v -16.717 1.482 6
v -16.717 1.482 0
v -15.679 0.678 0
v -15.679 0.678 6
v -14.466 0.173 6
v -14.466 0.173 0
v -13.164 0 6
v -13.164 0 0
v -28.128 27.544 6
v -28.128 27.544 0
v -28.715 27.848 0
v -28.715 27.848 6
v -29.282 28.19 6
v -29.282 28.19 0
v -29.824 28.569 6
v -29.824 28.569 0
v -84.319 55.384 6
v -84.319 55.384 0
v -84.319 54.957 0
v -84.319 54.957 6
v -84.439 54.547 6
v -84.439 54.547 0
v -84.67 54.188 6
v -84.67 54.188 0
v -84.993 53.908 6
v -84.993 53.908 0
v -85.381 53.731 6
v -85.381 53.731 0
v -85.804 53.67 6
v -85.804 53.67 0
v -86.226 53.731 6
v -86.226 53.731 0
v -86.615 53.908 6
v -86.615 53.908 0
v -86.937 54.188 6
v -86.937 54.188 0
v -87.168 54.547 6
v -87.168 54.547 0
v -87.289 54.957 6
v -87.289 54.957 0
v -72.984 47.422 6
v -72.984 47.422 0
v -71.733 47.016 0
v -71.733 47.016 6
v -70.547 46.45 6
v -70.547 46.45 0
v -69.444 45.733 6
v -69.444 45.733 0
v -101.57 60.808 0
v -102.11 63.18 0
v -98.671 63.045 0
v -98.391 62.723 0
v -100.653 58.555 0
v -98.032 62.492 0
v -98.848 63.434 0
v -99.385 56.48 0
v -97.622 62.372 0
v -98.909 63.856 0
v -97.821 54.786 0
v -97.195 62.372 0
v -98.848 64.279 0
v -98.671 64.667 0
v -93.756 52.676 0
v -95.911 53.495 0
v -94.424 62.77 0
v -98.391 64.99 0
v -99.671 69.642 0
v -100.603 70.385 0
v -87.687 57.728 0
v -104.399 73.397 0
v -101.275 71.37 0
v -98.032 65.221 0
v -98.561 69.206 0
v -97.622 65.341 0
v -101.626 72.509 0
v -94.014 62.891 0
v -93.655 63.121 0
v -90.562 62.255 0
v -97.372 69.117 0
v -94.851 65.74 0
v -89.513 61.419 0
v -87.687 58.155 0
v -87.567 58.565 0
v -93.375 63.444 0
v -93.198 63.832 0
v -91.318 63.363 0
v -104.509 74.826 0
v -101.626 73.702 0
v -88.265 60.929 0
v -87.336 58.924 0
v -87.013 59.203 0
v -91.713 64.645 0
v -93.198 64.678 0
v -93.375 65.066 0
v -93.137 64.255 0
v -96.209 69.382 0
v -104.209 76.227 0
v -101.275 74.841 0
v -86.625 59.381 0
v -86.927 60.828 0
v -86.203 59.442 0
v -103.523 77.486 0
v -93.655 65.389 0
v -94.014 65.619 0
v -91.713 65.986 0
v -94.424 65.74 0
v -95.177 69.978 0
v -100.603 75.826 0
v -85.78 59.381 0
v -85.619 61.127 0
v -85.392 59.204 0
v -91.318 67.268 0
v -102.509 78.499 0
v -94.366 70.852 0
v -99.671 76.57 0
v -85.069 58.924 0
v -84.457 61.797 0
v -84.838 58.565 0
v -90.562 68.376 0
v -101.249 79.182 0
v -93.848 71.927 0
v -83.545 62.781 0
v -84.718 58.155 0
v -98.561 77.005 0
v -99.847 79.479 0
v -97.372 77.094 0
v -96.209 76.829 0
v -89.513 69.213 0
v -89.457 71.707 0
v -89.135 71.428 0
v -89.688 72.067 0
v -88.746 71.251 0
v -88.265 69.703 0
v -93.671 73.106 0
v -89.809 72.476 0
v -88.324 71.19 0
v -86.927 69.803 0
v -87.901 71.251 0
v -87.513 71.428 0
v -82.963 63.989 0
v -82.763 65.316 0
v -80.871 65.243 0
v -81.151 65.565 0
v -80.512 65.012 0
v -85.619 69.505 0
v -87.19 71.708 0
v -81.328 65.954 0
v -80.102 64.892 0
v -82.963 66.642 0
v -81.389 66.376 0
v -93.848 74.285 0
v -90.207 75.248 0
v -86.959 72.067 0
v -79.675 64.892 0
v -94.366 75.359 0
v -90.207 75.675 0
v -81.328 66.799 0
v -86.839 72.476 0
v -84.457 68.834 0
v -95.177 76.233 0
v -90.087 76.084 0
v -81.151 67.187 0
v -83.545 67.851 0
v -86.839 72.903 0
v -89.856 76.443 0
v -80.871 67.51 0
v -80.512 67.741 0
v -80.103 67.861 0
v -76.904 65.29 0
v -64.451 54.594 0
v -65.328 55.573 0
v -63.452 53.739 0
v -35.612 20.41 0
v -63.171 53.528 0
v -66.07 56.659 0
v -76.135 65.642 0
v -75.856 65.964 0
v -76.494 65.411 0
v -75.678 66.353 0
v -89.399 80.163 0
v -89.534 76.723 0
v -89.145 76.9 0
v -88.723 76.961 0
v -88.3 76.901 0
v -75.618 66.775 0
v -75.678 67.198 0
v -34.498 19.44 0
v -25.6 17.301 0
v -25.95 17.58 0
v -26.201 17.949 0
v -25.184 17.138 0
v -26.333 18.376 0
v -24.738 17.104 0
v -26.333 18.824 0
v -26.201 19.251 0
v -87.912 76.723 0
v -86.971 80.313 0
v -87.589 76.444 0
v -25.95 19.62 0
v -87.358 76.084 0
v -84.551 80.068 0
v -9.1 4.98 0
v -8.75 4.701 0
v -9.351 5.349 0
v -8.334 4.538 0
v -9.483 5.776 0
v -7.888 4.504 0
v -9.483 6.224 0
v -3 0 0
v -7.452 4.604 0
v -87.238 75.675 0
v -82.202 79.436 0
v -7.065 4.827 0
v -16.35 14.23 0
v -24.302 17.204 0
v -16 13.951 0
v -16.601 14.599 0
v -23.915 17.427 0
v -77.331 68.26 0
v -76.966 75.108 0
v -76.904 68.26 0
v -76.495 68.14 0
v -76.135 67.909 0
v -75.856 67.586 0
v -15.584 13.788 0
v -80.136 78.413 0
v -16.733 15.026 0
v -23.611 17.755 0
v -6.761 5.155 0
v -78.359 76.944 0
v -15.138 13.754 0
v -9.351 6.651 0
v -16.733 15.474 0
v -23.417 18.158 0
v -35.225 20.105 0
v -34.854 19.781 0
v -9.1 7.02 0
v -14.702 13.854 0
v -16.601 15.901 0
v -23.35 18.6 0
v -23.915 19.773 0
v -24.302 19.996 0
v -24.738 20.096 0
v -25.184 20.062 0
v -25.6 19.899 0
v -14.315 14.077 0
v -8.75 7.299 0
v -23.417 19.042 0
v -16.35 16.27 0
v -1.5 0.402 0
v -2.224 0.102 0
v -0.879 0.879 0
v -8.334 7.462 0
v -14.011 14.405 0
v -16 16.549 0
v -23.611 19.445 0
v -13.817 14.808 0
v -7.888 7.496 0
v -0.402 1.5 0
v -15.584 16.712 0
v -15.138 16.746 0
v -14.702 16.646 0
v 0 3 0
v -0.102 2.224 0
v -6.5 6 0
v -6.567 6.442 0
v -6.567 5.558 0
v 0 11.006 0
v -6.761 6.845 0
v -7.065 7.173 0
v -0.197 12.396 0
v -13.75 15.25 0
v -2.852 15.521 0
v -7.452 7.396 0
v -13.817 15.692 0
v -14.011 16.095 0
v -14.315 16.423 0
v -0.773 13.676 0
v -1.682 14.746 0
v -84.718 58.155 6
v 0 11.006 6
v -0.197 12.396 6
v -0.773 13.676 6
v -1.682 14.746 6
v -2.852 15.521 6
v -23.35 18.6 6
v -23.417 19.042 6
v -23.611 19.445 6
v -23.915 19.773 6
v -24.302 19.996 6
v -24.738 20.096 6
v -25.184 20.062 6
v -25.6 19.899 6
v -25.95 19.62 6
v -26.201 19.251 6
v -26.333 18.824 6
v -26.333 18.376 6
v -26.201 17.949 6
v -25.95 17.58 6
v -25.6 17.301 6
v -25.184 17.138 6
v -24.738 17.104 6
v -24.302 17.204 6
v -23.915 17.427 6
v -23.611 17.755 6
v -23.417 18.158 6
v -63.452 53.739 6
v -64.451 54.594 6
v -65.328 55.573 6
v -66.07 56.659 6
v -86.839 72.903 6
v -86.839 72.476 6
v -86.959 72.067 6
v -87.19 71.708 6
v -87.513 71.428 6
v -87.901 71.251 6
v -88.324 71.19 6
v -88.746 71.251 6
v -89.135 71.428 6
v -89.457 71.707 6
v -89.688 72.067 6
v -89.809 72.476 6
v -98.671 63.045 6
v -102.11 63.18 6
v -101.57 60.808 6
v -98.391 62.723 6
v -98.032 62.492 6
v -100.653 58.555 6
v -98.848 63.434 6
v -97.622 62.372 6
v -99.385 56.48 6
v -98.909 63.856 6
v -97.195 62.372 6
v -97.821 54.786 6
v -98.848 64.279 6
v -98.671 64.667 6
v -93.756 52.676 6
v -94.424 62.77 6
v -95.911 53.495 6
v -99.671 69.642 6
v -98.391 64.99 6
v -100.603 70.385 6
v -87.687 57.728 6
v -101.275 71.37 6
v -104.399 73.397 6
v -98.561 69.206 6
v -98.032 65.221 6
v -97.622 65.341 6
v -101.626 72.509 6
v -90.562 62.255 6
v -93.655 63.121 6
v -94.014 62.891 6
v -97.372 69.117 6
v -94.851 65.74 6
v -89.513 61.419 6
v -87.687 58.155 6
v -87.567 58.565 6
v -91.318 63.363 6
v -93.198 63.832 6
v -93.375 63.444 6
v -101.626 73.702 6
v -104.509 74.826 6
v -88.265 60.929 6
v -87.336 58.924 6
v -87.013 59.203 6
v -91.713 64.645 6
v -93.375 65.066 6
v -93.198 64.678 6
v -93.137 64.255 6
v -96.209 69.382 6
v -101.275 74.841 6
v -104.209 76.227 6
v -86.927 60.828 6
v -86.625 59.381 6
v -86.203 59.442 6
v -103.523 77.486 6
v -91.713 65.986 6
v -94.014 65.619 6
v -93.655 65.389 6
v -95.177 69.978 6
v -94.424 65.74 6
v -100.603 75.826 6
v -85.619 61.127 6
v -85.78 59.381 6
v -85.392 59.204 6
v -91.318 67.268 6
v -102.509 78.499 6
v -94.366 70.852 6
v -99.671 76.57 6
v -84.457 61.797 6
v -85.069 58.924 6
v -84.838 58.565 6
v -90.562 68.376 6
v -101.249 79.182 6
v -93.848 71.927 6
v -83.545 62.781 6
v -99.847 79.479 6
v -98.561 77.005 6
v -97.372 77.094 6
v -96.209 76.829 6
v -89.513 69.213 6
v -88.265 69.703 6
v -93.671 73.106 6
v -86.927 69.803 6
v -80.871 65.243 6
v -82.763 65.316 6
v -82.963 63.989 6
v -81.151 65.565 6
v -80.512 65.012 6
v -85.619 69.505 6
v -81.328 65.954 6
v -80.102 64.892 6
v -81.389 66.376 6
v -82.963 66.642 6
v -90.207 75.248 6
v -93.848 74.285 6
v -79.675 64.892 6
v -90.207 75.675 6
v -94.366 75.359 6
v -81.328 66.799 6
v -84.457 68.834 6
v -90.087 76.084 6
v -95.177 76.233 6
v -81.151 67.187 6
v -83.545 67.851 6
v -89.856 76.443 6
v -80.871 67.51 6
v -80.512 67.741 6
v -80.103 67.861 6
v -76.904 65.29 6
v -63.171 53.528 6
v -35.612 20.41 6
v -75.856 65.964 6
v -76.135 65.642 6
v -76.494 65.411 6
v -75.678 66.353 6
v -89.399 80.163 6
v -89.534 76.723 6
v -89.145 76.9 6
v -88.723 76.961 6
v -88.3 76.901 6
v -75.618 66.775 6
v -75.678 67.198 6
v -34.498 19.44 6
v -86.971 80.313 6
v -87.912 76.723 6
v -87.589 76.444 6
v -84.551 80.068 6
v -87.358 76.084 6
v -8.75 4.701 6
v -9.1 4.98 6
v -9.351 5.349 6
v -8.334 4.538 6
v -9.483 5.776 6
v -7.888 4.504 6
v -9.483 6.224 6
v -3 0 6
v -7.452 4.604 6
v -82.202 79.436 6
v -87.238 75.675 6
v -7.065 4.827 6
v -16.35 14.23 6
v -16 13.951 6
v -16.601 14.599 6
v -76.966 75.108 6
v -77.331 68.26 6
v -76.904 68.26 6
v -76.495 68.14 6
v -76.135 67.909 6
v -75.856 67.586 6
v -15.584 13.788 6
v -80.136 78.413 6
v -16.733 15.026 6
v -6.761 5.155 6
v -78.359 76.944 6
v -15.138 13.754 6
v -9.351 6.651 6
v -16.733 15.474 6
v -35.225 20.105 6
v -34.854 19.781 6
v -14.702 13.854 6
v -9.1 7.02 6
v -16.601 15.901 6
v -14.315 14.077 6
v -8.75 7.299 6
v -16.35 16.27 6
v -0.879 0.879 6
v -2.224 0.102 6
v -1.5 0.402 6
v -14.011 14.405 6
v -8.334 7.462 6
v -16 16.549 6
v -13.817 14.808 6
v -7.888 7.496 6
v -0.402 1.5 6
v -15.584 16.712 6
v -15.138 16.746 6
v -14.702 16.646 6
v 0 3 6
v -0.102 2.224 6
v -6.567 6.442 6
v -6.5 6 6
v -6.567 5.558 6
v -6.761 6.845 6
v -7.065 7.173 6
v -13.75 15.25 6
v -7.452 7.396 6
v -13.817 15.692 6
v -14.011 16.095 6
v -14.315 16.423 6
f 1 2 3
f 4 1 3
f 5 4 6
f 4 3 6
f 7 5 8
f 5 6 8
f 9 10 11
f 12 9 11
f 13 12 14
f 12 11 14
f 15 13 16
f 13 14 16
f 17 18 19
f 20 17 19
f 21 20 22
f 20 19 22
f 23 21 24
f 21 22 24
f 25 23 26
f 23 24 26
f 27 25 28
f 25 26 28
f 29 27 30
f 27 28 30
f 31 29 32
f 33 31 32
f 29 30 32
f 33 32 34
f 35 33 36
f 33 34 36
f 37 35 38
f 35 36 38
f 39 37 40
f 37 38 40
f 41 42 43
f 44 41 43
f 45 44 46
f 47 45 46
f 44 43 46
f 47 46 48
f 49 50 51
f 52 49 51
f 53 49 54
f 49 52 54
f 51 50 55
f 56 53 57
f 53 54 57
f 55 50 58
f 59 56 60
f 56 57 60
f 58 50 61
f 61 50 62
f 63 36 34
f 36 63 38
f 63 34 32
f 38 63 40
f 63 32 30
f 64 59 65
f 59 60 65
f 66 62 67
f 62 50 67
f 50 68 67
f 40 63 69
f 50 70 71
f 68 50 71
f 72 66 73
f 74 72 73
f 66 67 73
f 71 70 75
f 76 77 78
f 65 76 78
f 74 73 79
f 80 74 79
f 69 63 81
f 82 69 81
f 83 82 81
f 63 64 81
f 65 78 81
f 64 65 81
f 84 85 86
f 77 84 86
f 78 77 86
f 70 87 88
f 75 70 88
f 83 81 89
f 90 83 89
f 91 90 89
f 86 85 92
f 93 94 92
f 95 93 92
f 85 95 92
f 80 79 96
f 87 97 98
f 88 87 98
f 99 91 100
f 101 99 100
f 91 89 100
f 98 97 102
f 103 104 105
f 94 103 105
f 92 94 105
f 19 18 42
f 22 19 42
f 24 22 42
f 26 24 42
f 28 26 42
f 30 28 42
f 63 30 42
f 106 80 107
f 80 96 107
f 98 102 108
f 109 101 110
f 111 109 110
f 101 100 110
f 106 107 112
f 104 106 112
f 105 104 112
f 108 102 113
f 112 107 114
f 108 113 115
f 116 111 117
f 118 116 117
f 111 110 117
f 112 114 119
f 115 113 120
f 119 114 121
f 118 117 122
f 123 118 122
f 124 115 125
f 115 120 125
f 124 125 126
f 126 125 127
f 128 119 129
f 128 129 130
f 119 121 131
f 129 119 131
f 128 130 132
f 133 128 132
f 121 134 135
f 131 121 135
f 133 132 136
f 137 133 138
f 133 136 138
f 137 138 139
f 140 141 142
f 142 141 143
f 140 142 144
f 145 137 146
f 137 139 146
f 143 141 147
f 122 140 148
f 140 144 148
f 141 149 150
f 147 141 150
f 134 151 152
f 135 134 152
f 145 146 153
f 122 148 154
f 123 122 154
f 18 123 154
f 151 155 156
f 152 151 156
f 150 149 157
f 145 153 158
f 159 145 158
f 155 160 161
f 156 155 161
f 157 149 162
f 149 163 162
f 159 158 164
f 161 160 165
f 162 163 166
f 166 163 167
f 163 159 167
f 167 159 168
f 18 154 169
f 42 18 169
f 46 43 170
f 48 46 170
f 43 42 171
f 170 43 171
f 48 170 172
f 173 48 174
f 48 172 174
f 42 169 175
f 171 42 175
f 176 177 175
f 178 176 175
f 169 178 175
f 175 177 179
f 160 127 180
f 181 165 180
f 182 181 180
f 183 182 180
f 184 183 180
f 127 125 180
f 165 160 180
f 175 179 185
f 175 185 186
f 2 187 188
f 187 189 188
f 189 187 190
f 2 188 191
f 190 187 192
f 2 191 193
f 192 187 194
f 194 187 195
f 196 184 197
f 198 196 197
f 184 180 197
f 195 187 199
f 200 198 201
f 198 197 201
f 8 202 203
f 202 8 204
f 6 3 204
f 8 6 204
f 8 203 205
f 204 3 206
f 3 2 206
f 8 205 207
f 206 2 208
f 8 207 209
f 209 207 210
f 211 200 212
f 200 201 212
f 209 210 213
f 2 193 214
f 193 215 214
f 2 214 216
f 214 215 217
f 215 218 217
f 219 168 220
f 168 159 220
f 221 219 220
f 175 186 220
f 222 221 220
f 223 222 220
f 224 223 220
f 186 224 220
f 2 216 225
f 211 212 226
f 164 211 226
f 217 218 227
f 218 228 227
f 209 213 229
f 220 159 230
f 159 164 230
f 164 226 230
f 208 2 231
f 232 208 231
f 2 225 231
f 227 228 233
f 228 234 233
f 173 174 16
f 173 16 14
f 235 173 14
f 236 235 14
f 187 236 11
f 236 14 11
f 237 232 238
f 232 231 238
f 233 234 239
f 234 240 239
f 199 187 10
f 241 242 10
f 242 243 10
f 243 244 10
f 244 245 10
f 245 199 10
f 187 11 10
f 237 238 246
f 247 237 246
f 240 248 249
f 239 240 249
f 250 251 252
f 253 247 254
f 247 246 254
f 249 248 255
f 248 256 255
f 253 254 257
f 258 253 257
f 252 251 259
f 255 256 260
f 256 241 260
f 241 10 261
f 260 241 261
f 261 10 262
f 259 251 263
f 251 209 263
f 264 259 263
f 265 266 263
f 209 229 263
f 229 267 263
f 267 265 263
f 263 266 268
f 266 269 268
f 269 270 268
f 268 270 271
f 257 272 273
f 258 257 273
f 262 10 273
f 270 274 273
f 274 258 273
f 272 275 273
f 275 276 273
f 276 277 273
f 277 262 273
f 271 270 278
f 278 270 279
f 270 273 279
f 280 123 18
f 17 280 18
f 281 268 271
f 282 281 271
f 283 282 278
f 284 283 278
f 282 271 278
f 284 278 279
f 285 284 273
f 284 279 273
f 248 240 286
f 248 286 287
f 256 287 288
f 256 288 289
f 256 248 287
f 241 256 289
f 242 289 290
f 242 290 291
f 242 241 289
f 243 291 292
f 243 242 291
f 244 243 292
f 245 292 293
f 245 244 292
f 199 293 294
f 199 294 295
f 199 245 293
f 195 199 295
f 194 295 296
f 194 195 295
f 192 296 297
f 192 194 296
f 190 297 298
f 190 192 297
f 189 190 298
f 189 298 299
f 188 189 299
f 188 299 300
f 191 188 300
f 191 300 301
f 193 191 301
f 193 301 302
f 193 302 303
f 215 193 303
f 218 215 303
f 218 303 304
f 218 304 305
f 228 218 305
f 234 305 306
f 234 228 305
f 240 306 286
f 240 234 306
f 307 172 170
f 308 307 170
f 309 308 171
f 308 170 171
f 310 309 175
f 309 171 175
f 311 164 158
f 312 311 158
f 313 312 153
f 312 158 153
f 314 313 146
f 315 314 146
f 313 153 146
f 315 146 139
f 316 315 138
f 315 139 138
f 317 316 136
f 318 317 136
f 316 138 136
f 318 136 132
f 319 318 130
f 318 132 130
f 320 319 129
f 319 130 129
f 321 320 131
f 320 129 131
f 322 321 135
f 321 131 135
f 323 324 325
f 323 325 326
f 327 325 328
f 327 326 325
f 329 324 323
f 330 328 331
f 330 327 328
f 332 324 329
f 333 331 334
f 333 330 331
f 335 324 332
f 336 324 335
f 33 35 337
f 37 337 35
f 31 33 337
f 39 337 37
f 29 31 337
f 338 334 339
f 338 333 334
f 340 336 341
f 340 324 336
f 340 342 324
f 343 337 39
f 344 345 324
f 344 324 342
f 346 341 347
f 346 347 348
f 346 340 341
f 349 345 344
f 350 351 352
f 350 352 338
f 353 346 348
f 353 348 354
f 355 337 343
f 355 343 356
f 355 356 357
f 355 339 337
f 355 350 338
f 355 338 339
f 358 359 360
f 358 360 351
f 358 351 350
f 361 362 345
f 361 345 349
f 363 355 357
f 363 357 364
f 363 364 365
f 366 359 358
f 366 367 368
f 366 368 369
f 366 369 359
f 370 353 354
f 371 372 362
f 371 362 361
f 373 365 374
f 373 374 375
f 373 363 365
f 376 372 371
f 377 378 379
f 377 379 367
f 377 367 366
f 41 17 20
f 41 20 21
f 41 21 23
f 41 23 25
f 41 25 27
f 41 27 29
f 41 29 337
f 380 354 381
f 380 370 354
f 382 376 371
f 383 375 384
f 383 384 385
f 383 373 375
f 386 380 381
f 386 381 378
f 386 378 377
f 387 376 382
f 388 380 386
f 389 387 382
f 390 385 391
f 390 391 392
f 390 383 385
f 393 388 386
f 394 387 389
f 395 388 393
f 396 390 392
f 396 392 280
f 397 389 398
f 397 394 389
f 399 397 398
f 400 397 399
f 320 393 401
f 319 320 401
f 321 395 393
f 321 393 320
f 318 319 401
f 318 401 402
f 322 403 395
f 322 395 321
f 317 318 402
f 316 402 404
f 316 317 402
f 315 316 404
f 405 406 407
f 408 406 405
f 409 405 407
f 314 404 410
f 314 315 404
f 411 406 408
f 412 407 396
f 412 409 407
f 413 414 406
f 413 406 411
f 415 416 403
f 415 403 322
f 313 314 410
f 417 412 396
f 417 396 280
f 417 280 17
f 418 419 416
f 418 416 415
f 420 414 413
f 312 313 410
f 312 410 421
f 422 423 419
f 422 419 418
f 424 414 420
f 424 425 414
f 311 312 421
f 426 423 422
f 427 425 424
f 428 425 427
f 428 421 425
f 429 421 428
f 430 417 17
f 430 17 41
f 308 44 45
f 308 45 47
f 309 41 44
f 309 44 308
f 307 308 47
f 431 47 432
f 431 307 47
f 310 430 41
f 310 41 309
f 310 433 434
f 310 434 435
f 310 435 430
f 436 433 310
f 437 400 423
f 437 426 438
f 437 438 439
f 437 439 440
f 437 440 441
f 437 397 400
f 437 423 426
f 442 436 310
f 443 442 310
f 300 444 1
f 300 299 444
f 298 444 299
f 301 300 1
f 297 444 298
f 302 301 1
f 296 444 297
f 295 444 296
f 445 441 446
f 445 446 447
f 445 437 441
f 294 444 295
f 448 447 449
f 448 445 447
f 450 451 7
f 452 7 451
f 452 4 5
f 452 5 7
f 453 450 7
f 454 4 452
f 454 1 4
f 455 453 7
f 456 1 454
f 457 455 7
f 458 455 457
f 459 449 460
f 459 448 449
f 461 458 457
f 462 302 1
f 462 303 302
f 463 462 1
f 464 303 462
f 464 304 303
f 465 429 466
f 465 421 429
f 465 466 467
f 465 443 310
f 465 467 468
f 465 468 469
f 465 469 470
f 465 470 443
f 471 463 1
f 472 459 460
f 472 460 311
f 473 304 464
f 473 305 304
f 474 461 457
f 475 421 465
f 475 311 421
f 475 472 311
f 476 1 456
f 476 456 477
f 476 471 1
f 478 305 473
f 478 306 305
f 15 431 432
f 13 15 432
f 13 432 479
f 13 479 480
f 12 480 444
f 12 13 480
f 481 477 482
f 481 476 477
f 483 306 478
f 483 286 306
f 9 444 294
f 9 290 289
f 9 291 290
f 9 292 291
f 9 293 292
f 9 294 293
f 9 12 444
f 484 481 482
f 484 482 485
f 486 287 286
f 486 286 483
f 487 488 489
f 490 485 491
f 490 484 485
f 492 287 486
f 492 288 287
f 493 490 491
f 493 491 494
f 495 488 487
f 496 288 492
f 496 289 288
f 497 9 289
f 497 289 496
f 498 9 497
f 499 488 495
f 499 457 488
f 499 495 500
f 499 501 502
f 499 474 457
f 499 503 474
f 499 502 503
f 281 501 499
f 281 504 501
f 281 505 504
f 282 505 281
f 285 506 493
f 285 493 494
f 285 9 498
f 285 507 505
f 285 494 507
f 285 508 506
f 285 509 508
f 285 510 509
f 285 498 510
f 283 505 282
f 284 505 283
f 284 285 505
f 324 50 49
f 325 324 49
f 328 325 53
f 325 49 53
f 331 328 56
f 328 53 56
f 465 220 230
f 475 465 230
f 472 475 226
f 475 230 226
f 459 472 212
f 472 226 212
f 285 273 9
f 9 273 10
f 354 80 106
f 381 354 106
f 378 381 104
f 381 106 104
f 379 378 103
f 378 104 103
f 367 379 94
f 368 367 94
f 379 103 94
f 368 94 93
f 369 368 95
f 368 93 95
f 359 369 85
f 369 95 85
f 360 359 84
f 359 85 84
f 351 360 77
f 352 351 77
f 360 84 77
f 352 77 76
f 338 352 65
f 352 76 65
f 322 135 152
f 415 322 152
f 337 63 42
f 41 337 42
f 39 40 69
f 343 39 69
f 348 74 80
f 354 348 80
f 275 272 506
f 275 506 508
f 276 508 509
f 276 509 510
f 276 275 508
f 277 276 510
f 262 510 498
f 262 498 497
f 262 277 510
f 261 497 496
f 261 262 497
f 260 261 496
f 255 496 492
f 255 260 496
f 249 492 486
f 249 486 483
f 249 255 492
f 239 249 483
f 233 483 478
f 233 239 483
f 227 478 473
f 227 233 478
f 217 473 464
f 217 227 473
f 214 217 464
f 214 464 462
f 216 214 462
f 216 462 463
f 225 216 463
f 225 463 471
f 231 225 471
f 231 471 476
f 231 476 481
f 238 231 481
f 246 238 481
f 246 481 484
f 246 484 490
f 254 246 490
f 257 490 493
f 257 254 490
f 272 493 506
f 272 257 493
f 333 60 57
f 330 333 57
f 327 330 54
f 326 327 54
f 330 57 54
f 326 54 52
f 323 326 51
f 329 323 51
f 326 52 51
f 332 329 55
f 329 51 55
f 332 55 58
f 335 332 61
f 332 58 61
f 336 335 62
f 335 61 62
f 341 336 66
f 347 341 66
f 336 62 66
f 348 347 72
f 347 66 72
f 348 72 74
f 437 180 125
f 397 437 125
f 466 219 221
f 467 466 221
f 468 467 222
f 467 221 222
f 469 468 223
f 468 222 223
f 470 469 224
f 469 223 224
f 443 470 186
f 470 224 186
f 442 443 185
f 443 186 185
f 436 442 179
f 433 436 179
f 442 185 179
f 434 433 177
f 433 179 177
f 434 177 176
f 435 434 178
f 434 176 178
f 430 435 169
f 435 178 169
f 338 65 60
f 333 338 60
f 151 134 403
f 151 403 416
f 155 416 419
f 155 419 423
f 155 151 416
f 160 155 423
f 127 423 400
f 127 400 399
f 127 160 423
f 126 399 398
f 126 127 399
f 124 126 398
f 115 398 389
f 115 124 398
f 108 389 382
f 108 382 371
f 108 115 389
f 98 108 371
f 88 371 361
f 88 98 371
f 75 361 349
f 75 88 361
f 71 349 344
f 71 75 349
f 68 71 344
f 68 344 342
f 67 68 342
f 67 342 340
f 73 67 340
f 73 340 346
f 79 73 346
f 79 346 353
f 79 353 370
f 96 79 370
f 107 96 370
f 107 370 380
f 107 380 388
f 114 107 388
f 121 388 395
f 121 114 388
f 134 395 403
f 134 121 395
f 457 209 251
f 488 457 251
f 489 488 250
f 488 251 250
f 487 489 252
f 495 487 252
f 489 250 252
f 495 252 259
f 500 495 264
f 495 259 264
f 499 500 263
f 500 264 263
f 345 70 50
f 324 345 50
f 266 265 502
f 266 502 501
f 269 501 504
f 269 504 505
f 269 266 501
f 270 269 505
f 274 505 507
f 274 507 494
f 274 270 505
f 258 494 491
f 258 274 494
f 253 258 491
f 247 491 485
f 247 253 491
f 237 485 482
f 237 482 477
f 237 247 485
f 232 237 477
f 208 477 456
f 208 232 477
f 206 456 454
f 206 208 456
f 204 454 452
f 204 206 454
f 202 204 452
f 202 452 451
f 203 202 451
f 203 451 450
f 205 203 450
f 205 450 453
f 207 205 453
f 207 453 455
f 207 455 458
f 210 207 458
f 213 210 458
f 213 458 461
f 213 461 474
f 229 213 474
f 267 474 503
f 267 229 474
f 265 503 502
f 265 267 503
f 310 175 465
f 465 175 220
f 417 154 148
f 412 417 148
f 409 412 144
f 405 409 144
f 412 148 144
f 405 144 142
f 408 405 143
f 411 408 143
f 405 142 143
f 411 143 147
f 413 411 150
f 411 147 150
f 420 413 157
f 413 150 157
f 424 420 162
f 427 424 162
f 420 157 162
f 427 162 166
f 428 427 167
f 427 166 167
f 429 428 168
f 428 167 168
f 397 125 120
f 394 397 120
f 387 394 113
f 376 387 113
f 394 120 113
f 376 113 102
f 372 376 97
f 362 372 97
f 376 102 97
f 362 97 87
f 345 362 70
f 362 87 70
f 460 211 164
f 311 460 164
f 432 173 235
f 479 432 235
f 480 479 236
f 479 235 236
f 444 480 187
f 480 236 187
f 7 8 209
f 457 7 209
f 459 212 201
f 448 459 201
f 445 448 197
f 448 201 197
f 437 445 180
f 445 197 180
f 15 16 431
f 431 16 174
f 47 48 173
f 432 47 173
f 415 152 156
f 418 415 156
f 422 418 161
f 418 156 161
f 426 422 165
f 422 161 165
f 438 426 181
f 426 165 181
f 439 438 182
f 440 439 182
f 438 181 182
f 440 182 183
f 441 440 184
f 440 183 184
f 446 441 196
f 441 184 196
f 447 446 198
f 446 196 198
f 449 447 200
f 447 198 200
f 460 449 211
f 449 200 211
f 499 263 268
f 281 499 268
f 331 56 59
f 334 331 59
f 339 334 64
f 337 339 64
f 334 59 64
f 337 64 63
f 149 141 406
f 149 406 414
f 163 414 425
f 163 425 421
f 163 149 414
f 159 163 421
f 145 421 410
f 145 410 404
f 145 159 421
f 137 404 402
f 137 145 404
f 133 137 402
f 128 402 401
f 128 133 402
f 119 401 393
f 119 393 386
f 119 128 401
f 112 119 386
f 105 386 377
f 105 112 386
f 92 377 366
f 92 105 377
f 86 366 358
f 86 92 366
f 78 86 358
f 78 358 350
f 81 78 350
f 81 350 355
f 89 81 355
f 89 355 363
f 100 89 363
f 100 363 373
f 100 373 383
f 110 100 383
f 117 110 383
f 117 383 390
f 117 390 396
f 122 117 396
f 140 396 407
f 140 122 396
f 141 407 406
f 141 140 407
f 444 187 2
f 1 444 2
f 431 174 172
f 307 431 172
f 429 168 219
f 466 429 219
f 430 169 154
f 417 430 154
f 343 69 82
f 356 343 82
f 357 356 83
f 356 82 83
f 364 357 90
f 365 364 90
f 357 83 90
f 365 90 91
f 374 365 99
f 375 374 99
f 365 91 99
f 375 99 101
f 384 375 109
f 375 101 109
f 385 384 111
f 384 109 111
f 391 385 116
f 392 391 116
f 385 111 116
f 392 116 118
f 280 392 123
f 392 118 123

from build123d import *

# Parameters (mm, degrees)
CROQUIS1_R              = 1.5
CROQUIS1_R_2            = 4
CROQUIS1_R_3            = 4.5
SALIENTE_EXTRUIR1_DEPTH = 6


with BuildPart() as part:
    # Croquis1 → Saliente-Extruir1 (new body)
    with BuildSketch(Plane.XY):
        with BuildLine():
            Line((0, 3), (0, 11.005922656))
            ThreePointArc((0, 11.005922656), (-0.772770469, 13.676227974), (-2.852212196, 15.521120055))
            Line((-2.852212196, 15.521120055), (-28.127681877, 27.544148224))
            ThreePointArc((-28.127681877, 27.544148224), (-29.001474549, 28.014307534), (-29.824371512, 28.568747792))
            Line((-29.824371512, 28.568747792), (-63.171065255, 53.528446126))
            Line((-63.171065255, 53.528446126), (-63.451967787, 53.738699128))
            ThreePointArc((-63.451967787, 53.738699128), (-64.905667664, 55.069346162), (-66.070176318, 56.659246931))
            Line((-66.070176318, 56.659246931), (-76.965636536, 75.10772477))
            ThreePointArc((-76.965636536, 75.10772477), (-79.204988458, 77.730188181), (-82.201994916, 79.436049742))
            ThreePointArc((-82.201994916, 79.436049742), (-85.75594879, 80.239775378), (-89.398839068, 80.162876369))
            Line((-89.398839068, 80.162876369), (-99.846657066, 79.479321846))
            ThreePointArc((-99.846657066, 79.479321846), (-103.523124692, 77.4861215), (-104.39928334, 73.396915238))
            Line((-104.39928334, 73.396915238), (-102.110353231, 63.180020081))
            ThreePointArc((-102.110353231, 63.180020081), (-101.157367153, 59.663149232), (-99.384526804, 56.479817622))
            ThreePointArc((-99.384526804, 56.479817622), (-96.903104349, 54.085124746), (-93.75579069, 52.675717741))
            Line((-93.75579069, 52.675717741), (-72.984328521, 47.421790897))
            ThreePointArc((-72.984328521, 47.421790897), (-71.130664391, 46.752616664), (-69.44423303, 45.732903898))
            Line((-69.44423303, 45.732903898), (-35.612091664, 20.409852413))
            ThreePointArc((-35.612091664, 20.409852413), (-35.03729077, 19.945518736), (-34.498346176, 19.44000854))
            Line((-34.498346176, 19.44000854), (-16.717412791, 1.482024321))
            ThreePointArc((-16.717412791, 1.482024321), (-15.089260875, 0.385356005), (-13.164407425, 0))
            Line((-13.164407425, 0), (-3, 0))
            ThreePointArc((-3, 0), (-0.878679656, 0.878679656), (0, 3))
        make_face()
        with Locations((-24.85, 18.6)):
            Circle(CROQUIS1_R, mode=Mode.SUBTRACT)
        with Locations((-8, 6)):
            Circle(CROQUIS1_R, mode=Mode.SUBTRACT)
        with Locations((-97.670701805, 73.105635959)):
            Circle(CROQUIS1_R_2, mode=Mode.SUBTRACT)
        with Locations((-87.263168006, 65.315691143)):
            Circle(CROQUIS1_R_3, mode=Mode.SUBTRACT)
        with Locations((-15.25, 15.25)):
            Circle(CROQUIS1_R, mode=Mode.SUBTRACT)
        with BuildLine():
            Line((-87.237824709, 75.67483482), (-86.839166111, 72.903360245))
            ThreePointArc((-86.839166111, 72.903360245), (-88.110317527, 71.205074616), (-89.808603156, 72.476226032))
            Line((-89.808603156, 72.476226032), (-90.207261755, 75.247700608))
            ThreePointArc((-90.207261755, 75.247700608), (-88.936110338, 76.945986237), (-87.237824709, 75.67483482))
        make_face(mode=Mode.SUBTRACT)
        with BuildLine():
            Line((-76.904024329, 65.290347847), (-79.675498905, 64.891689248))
            ThreePointArc((-79.675498905, 64.891689248), (-81.373784533, 66.162840665), (-80.102633117, 67.861126294))
            Line((-80.102633117, 67.861126294), (-77.331158542, 68.259784892))
            ThreePointArc((-77.331158542, 68.259784892), (-75.632872913, 66.988633476), (-76.904024329, 65.290347847))
        make_face(mode=Mode.SUBTRACT)
        with BuildLine():
            Line((-87.288511303, 54.956547467), (-87.687169901, 57.728022042))
            ThreePointArc((-87.687169901, 57.728022042), (-86.416018485, 59.426307671), (-84.717732856, 58.155156254))
            Line((-84.717732856, 58.155156254), (-84.319074258, 55.383681679))
            ThreePointArc((-84.319074258, 55.383681679), (-85.590225674, 53.68539605), (-87.288511303, 54.956547467))
        make_face(mode=Mode.SUBTRACT)
        with BuildLine():
            Line((-97.622311683, 65.34103444), (-94.850837108, 65.739693038))
            ThreePointArc((-94.850837108, 65.739693038), (-93.152551479, 64.468541622), (-94.423702895, 62.770255993))
            Line((-94.423702895, 62.770255993), (-97.19517747, 62.371597395))
            ThreePointArc((-97.19517747, 62.371597395), (-98.893463099, 63.642748811), (-97.622311683, 65.34103444))
        make_face(mode=Mode.SUBTRACT)
    extrude(amount=SALIENTE_EXTRUIR1_DEPTH)


solid = part.part
